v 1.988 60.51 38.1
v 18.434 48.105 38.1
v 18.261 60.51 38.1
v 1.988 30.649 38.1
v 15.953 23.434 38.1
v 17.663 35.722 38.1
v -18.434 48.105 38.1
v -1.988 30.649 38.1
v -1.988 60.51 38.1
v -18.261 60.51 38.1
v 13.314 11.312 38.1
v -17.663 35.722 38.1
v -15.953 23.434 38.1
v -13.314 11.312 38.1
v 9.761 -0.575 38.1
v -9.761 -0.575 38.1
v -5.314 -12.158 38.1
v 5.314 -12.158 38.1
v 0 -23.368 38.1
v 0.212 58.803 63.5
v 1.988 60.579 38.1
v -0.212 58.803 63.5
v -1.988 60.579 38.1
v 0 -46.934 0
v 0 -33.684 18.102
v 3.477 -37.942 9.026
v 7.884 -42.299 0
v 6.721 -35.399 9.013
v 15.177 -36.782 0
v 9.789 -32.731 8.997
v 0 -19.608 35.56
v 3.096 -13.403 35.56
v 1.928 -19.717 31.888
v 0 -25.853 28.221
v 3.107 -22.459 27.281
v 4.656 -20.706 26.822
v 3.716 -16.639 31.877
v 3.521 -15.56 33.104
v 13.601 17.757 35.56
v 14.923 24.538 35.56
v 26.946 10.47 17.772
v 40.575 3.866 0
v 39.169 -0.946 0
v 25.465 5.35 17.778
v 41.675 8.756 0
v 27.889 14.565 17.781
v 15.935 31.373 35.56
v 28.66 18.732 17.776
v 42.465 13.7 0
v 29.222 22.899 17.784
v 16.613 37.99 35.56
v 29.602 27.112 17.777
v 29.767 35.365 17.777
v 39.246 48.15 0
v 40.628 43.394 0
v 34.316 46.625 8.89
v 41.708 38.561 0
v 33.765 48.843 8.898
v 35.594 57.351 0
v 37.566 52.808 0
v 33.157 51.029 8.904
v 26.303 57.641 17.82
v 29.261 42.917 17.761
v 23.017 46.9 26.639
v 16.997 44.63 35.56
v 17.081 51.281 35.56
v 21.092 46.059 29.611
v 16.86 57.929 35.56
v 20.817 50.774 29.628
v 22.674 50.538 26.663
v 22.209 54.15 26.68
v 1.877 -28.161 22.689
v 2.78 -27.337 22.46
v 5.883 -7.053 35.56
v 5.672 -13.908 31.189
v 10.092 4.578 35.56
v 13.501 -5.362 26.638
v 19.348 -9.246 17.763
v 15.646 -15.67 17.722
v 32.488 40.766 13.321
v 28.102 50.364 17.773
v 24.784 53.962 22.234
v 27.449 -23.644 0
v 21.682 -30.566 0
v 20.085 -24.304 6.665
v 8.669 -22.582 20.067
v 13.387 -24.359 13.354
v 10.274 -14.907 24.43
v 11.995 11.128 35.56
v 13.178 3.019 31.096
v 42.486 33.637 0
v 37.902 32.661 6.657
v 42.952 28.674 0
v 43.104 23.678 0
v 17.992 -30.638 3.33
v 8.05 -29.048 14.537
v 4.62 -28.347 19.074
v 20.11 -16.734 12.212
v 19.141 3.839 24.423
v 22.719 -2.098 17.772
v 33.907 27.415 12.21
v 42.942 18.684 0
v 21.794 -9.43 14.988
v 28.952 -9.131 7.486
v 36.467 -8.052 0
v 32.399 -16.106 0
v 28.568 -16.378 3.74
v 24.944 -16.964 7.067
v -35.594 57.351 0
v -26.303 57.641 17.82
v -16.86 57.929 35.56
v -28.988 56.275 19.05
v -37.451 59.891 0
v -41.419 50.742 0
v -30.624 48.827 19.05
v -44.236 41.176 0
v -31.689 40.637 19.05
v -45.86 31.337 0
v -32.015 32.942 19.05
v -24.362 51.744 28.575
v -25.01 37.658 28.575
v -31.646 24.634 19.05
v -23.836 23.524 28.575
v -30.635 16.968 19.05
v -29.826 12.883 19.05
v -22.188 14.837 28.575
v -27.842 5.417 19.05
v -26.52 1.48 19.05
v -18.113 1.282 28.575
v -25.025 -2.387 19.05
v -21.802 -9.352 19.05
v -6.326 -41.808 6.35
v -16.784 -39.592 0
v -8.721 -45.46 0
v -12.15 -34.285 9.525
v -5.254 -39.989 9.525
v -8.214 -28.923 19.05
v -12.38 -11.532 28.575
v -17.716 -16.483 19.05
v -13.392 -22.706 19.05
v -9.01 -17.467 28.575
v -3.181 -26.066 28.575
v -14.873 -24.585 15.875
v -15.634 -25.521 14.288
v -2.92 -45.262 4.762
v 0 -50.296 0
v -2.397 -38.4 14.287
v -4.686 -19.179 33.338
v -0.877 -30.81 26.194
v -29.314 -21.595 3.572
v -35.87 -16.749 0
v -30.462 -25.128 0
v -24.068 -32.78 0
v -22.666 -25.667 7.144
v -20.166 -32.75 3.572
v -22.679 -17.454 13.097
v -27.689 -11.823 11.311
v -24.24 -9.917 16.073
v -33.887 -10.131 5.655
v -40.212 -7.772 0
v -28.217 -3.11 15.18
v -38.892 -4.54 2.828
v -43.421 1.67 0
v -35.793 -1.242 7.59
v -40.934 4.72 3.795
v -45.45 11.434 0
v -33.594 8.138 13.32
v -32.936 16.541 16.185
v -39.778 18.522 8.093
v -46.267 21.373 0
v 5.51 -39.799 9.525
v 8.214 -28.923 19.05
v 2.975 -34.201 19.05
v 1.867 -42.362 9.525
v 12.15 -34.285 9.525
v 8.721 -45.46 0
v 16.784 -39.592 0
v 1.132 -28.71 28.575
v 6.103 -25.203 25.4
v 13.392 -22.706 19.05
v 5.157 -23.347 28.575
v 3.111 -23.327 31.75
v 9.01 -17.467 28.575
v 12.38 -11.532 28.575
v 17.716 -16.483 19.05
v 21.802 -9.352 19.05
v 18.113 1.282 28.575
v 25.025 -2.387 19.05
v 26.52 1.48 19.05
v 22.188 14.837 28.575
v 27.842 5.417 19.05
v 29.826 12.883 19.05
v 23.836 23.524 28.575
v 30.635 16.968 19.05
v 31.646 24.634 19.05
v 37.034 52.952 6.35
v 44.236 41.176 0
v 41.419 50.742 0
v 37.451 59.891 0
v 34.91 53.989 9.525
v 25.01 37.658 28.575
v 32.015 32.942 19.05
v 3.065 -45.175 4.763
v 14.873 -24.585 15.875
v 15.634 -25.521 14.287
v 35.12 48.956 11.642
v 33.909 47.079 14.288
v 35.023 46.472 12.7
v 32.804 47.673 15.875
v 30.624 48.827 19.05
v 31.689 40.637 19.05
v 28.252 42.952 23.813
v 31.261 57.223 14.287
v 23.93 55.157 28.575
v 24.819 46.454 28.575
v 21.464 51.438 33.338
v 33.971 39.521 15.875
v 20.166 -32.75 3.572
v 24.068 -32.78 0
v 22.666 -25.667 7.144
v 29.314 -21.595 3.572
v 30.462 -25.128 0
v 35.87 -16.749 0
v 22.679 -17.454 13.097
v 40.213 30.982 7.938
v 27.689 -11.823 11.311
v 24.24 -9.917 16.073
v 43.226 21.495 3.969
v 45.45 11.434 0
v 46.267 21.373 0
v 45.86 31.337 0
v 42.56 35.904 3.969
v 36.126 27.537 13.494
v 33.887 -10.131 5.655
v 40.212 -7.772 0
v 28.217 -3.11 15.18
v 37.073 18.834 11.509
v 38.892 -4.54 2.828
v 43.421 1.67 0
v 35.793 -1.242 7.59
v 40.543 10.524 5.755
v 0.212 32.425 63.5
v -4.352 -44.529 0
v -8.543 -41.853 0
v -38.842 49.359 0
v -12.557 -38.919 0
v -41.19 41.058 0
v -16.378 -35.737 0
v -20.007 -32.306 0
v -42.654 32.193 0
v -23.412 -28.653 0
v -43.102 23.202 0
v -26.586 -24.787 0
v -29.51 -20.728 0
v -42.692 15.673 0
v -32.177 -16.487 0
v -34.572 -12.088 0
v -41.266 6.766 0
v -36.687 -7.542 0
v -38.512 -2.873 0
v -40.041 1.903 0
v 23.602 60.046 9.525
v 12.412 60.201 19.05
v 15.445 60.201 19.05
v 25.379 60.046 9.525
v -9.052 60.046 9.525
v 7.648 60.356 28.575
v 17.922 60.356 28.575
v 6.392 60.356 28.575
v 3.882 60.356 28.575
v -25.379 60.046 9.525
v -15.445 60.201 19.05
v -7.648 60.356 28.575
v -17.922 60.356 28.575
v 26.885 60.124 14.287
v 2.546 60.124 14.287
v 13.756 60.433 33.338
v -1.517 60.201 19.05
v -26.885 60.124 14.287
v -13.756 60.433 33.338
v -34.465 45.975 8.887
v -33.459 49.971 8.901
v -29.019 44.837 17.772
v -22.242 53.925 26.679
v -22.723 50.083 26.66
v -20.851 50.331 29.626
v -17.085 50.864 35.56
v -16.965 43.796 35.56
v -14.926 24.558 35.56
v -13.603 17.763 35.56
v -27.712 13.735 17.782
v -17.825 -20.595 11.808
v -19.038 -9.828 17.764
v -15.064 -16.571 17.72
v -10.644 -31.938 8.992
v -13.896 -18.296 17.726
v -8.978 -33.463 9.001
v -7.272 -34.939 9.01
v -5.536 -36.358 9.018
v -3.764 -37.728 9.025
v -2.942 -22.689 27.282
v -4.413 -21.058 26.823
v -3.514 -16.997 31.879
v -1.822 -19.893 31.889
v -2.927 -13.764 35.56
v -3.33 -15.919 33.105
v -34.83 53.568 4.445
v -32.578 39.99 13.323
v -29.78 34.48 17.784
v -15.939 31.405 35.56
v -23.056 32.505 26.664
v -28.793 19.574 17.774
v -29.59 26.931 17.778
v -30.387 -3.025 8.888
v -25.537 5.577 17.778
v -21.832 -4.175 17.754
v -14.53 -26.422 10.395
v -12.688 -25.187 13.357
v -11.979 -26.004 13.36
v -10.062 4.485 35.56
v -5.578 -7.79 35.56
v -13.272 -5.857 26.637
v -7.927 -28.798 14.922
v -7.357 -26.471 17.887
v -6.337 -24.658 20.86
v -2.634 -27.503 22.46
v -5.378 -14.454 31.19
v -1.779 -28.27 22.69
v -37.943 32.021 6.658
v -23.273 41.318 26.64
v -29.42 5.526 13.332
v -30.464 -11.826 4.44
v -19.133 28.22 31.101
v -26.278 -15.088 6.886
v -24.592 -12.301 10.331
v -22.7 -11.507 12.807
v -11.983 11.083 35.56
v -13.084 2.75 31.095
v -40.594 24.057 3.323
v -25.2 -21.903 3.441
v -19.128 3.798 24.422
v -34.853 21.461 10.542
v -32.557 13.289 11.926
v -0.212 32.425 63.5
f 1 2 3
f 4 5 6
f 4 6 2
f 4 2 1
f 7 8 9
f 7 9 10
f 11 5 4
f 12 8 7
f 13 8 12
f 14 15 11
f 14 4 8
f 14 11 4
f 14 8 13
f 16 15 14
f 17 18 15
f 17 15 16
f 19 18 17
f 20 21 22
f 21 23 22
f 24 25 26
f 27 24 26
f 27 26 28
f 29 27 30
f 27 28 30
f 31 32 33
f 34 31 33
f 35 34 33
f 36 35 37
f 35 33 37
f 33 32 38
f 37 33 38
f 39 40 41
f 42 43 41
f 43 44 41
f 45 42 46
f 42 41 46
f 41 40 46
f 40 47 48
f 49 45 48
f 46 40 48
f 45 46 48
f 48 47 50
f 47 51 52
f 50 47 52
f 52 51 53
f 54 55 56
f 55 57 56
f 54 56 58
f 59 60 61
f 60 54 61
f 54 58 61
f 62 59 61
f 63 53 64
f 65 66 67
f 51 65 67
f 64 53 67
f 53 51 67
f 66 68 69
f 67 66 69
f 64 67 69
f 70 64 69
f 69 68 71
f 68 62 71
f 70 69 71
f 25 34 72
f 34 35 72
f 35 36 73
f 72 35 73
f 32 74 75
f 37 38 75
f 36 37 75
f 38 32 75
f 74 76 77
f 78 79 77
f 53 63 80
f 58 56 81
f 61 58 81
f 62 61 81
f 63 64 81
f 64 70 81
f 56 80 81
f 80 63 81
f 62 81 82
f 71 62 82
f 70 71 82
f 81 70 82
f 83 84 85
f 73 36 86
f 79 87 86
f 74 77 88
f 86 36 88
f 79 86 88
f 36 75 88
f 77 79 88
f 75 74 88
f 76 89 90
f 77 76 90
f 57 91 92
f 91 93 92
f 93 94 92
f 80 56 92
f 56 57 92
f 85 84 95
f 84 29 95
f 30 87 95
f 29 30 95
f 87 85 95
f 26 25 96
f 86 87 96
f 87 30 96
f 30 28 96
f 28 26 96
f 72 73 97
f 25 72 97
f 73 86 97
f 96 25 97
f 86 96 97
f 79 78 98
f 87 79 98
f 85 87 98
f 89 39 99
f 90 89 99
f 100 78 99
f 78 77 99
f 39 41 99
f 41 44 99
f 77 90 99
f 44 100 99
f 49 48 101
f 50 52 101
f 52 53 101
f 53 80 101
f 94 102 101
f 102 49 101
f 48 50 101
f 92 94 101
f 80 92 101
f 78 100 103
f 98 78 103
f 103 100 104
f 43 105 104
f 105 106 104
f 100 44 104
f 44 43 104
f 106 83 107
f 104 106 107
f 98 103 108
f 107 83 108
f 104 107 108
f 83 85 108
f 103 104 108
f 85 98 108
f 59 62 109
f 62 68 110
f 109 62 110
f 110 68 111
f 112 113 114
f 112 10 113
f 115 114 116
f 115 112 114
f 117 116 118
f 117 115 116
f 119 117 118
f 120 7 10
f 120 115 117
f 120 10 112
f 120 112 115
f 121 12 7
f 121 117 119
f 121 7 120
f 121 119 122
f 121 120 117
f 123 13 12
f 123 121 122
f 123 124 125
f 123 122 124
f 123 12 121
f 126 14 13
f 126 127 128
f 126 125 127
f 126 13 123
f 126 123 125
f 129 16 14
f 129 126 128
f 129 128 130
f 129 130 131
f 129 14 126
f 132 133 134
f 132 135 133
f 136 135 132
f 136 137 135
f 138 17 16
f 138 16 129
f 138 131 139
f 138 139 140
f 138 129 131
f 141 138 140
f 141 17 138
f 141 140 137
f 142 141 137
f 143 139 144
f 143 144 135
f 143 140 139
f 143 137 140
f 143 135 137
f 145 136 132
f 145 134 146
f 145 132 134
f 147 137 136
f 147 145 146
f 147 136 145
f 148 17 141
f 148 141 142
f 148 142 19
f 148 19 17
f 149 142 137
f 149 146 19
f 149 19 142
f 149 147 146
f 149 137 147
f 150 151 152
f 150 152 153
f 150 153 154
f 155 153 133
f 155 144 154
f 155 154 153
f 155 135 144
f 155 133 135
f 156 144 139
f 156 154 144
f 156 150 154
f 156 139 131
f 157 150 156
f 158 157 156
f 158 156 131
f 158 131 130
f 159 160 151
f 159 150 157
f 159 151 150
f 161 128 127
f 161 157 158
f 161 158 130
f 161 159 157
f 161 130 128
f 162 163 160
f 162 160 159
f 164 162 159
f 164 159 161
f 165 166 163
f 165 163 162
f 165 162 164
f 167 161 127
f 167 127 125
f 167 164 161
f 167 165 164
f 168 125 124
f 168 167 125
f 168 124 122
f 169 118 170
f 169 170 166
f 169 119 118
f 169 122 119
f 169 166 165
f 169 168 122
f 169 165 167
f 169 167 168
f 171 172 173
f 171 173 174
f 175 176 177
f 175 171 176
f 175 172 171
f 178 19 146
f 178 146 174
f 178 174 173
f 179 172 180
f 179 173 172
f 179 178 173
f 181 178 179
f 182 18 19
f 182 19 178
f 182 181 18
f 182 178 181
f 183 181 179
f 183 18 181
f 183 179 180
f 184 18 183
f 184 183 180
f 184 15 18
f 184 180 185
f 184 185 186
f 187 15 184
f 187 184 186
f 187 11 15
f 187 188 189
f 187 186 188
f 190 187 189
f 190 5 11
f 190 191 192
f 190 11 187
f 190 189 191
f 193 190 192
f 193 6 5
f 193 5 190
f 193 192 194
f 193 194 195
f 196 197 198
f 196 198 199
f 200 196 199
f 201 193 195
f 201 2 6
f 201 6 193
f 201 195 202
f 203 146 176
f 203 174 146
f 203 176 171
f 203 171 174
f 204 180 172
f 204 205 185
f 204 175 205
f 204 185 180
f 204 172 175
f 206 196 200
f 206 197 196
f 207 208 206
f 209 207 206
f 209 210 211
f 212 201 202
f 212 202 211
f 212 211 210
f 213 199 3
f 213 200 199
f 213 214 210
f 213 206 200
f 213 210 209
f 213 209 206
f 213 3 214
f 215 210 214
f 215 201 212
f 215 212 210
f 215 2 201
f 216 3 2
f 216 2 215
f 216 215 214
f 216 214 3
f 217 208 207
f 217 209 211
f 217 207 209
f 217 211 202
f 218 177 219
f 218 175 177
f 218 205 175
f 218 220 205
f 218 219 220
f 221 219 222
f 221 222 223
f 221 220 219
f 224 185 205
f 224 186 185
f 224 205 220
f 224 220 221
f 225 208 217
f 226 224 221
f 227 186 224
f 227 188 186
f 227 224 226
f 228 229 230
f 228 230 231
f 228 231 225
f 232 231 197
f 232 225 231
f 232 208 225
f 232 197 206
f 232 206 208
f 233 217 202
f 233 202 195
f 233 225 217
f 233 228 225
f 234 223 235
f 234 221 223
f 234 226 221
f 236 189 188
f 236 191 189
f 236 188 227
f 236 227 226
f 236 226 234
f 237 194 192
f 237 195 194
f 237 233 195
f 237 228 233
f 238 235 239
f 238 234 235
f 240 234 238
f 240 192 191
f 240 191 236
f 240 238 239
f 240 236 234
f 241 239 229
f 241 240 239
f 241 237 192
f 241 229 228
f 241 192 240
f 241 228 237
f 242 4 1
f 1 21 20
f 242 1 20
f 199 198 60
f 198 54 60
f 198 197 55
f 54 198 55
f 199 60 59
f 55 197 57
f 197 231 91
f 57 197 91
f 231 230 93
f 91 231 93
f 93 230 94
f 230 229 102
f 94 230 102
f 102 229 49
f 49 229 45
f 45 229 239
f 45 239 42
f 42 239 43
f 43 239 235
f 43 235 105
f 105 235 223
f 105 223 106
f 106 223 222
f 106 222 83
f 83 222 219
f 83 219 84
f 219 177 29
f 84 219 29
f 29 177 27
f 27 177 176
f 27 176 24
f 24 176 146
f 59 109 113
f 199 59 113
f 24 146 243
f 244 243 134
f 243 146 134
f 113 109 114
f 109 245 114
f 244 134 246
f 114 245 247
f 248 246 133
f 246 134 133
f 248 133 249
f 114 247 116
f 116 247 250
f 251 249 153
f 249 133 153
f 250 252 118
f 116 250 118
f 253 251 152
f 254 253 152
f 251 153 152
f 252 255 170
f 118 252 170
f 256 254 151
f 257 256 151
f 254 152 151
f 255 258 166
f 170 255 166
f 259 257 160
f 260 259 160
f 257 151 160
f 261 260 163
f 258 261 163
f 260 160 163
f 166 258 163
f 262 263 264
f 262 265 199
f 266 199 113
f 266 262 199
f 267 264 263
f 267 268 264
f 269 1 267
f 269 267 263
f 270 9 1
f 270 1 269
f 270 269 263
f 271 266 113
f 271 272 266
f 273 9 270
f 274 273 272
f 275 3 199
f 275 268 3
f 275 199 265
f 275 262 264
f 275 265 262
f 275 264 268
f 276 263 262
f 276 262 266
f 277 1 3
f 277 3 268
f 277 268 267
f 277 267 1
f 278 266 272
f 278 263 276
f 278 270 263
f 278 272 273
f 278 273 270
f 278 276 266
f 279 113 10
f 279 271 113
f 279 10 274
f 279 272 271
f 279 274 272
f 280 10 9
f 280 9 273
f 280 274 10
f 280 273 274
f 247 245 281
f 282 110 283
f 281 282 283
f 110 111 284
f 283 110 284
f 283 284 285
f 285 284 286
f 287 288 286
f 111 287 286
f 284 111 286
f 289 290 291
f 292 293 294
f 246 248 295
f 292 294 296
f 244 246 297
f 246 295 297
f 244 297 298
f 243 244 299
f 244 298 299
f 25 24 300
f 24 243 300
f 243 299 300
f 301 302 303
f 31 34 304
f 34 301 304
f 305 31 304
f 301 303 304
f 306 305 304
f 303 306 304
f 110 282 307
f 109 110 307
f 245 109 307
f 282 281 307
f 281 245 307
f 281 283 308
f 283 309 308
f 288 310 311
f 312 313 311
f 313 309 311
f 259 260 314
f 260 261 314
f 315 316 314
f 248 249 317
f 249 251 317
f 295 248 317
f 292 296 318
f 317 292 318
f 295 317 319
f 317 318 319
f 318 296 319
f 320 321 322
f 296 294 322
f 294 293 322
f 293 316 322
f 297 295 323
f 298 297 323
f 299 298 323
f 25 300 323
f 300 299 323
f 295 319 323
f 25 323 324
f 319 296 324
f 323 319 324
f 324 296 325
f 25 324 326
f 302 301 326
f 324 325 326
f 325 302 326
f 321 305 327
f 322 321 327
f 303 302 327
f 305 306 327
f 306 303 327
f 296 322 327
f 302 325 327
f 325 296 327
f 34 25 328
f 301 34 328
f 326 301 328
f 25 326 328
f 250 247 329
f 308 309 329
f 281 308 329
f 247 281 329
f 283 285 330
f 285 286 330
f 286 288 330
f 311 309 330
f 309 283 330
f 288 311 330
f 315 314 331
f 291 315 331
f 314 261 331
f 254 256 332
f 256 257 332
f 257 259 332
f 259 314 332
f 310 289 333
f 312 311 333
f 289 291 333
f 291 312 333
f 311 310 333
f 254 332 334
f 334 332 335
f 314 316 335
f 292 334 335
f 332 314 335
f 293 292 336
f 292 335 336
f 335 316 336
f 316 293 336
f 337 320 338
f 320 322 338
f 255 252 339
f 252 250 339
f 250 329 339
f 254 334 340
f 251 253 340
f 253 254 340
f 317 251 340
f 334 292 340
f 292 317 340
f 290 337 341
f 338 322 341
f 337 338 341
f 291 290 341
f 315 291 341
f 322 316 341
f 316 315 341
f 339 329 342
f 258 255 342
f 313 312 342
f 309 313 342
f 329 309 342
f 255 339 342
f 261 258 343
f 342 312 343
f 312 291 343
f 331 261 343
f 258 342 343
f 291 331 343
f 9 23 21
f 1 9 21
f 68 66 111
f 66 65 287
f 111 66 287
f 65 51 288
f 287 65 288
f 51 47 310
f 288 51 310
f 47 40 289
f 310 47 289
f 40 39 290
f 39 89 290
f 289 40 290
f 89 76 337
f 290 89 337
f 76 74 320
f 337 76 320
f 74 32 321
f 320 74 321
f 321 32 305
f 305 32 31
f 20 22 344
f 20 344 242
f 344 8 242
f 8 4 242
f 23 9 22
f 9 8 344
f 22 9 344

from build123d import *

# Parameters (mm, degrees)
F4_T     = -2.54
F6_DEPTH = 25.4
F6_TAPER = 4


with BuildPart() as f3:
    # F0 (on Top) → F3 section 0
    with BuildSketch(Plane.XY):
        with BuildLine():
            Line((37.4514907598, 59.8914325237), (0, 59.8914325237))
            Line((0, 59.8914325237), (-37.4514907598, 59.8914325237))
            ThreePointArc((-37.4514907598, 59.8914325237), (-41.9616667547, -3.1000974537), (0, -50.2964220941))
            ThreePointArc((0, -50.2964220941), (41.9616667547, -3.1000974537), (37.4514907598, 59.8914325237))
        make_face()
    # F2 (on offset) → F3 section 1
    with BuildSketch(Plane.XY.offset(38.1)):
        with BuildLine():
            Line((0, 60.5104640126), (-18.2614699006, 60.5104640126))
            ThreePointArc((-18.2614699006, 60.5104640126), (-14.7486334866, 17.3479007496), (0, -23.3684927225))
            ThreePointArc((0, -23.3684927225), (14.7486334866, 17.3479007496), (18.2614699006, 60.5104640126))
            Line((18.2614699006, 60.5104640126), (0, 60.5104640126))
        make_face()
    loft()

    # F4
    f4_openings = [f3.faces().sort_by_distance(p)[0] for p in [
        (0, 12.627016, 0),
    ]]
    offset(amount=F4_T, openings=f4_openings, kind=Kind.INTERSECTION)

    # F5 (on offset) → F6 (join)
    with BuildSketch(Plane.XY.offset(38.1)):
        Polygon((1.9884528592, 60.578674078), (0, 60.578674078), (-1.9884528592, 60.578674078), (-1.9884528592, 30.6487604976), (0, 30.6487604976), (1.9884528592, 30.6487604976), align=None)
    extrude(amount=F6_DEPTH, taper=F6_TAPER)


solid = f3.part
